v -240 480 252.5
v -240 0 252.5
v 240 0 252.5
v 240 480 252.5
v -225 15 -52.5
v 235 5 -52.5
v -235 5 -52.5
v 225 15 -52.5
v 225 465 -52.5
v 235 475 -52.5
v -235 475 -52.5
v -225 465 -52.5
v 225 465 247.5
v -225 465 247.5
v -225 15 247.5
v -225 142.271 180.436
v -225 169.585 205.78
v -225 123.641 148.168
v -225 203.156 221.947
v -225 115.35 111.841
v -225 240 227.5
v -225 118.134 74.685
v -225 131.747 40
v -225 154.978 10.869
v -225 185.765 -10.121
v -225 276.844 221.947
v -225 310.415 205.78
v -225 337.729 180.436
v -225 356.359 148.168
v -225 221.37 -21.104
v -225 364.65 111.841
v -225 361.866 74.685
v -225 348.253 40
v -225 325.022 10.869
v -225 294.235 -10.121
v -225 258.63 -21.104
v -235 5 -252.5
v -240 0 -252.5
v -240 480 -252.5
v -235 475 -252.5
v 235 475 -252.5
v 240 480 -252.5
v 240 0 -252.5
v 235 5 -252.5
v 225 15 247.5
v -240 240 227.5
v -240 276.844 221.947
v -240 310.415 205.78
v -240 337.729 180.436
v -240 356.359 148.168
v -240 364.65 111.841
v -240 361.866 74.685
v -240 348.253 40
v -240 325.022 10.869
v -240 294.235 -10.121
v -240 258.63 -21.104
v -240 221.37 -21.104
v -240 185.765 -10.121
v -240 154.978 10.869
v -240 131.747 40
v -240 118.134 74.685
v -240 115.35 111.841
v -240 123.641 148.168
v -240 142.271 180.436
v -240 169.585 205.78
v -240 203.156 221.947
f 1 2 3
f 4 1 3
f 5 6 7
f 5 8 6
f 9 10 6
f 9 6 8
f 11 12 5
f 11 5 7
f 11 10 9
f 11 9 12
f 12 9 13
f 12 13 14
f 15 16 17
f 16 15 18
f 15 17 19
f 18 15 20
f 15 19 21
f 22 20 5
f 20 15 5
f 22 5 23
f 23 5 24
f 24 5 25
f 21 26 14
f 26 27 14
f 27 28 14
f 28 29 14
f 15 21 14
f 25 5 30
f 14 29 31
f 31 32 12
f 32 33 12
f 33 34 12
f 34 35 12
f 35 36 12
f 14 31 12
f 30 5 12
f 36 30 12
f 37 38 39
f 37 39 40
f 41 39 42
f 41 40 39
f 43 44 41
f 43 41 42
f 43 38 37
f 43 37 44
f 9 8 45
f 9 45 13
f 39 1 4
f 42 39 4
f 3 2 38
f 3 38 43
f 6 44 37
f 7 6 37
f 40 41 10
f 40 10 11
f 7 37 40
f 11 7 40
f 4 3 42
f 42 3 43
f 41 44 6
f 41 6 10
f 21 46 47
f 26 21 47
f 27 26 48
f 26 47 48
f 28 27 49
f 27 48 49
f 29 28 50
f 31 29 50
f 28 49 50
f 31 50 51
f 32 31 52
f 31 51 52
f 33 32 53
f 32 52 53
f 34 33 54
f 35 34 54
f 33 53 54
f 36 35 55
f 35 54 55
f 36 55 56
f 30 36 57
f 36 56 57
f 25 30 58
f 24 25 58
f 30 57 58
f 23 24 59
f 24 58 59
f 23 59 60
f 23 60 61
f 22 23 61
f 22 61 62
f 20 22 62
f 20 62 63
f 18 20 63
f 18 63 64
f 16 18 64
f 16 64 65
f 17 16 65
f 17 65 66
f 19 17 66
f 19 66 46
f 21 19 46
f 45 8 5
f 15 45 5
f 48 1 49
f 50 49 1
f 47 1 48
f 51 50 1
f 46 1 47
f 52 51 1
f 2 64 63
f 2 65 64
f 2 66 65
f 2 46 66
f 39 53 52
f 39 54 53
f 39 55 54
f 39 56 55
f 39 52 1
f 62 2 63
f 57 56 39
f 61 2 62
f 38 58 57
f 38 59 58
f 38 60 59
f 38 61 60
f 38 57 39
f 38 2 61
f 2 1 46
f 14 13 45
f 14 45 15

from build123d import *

# Parameters (mm, degrees)
CROQUIS2_W              = 480
CROQUIS2_H              = 505
SALIENTE_EXTRUIR1_DEPTH = 480
CROQUIS3_W              = 470
CROQUIS3_H              = 470
CORTAR_EXTRUIR1_DEPTH   = 200
CROQUIS5_W              = 450
CROQUIS5_H              = 450
CORTAR_EXTRUIR2_DEPTH   = 300
CROQUIS7_R              = 125
CORTAR_EXTRUIR3_DEPTH   = 300


with BuildPart() as part:
    # Croquis2 → Saliente-Extruir1 (new body)
    with BuildSketch(Plane(origin=(0, 0, 0), x_dir=(1, 0, 0), z_dir=(0, 1, 0))):
        Rectangle(CROQUIS2_W, CROQUIS2_H)
    extrude(amount=SALIENTE_EXTRUIR1_DEPTH)

    # Croquis3 → Cortar-Extruir1 (cut)
    with BuildSketch(Plane(origin=(0, 0, -252.5), x_dir=(-1, 0, 0), z_dir=(0, 0, -1))):
        with Locations((0, 240)):
            Rectangle(CROQUIS3_W, CROQUIS3_H)
    extrude(amount=-CORTAR_EXTRUIR1_DEPTH, mode=Mode.SUBTRACT)

    # Croquis5 → Cortar-Extruir2 (cut)
    with BuildSketch(Plane(origin=(0, 0, -52.5), x_dir=(-1, 0, 0), z_dir=(0, 0, -1))):
        with Locations((0, 240)):
            Rectangle(CROQUIS5_W, CROQUIS5_H)
    extrude(amount=-CORTAR_EXTRUIR2_DEPTH, mode=Mode.SUBTRACT)

    # Croquis7 → Cortar-Extruir3 (cut)
    with BuildSketch(Plane.ZY.offset(240)):
        with Locations((102.5, 240)):
            Circle(CROQUIS7_R)
    extrude(amount=-CORTAR_EXTRUIR3_DEPTH, mode=Mode.SUBTRACT)


solid = part.part
